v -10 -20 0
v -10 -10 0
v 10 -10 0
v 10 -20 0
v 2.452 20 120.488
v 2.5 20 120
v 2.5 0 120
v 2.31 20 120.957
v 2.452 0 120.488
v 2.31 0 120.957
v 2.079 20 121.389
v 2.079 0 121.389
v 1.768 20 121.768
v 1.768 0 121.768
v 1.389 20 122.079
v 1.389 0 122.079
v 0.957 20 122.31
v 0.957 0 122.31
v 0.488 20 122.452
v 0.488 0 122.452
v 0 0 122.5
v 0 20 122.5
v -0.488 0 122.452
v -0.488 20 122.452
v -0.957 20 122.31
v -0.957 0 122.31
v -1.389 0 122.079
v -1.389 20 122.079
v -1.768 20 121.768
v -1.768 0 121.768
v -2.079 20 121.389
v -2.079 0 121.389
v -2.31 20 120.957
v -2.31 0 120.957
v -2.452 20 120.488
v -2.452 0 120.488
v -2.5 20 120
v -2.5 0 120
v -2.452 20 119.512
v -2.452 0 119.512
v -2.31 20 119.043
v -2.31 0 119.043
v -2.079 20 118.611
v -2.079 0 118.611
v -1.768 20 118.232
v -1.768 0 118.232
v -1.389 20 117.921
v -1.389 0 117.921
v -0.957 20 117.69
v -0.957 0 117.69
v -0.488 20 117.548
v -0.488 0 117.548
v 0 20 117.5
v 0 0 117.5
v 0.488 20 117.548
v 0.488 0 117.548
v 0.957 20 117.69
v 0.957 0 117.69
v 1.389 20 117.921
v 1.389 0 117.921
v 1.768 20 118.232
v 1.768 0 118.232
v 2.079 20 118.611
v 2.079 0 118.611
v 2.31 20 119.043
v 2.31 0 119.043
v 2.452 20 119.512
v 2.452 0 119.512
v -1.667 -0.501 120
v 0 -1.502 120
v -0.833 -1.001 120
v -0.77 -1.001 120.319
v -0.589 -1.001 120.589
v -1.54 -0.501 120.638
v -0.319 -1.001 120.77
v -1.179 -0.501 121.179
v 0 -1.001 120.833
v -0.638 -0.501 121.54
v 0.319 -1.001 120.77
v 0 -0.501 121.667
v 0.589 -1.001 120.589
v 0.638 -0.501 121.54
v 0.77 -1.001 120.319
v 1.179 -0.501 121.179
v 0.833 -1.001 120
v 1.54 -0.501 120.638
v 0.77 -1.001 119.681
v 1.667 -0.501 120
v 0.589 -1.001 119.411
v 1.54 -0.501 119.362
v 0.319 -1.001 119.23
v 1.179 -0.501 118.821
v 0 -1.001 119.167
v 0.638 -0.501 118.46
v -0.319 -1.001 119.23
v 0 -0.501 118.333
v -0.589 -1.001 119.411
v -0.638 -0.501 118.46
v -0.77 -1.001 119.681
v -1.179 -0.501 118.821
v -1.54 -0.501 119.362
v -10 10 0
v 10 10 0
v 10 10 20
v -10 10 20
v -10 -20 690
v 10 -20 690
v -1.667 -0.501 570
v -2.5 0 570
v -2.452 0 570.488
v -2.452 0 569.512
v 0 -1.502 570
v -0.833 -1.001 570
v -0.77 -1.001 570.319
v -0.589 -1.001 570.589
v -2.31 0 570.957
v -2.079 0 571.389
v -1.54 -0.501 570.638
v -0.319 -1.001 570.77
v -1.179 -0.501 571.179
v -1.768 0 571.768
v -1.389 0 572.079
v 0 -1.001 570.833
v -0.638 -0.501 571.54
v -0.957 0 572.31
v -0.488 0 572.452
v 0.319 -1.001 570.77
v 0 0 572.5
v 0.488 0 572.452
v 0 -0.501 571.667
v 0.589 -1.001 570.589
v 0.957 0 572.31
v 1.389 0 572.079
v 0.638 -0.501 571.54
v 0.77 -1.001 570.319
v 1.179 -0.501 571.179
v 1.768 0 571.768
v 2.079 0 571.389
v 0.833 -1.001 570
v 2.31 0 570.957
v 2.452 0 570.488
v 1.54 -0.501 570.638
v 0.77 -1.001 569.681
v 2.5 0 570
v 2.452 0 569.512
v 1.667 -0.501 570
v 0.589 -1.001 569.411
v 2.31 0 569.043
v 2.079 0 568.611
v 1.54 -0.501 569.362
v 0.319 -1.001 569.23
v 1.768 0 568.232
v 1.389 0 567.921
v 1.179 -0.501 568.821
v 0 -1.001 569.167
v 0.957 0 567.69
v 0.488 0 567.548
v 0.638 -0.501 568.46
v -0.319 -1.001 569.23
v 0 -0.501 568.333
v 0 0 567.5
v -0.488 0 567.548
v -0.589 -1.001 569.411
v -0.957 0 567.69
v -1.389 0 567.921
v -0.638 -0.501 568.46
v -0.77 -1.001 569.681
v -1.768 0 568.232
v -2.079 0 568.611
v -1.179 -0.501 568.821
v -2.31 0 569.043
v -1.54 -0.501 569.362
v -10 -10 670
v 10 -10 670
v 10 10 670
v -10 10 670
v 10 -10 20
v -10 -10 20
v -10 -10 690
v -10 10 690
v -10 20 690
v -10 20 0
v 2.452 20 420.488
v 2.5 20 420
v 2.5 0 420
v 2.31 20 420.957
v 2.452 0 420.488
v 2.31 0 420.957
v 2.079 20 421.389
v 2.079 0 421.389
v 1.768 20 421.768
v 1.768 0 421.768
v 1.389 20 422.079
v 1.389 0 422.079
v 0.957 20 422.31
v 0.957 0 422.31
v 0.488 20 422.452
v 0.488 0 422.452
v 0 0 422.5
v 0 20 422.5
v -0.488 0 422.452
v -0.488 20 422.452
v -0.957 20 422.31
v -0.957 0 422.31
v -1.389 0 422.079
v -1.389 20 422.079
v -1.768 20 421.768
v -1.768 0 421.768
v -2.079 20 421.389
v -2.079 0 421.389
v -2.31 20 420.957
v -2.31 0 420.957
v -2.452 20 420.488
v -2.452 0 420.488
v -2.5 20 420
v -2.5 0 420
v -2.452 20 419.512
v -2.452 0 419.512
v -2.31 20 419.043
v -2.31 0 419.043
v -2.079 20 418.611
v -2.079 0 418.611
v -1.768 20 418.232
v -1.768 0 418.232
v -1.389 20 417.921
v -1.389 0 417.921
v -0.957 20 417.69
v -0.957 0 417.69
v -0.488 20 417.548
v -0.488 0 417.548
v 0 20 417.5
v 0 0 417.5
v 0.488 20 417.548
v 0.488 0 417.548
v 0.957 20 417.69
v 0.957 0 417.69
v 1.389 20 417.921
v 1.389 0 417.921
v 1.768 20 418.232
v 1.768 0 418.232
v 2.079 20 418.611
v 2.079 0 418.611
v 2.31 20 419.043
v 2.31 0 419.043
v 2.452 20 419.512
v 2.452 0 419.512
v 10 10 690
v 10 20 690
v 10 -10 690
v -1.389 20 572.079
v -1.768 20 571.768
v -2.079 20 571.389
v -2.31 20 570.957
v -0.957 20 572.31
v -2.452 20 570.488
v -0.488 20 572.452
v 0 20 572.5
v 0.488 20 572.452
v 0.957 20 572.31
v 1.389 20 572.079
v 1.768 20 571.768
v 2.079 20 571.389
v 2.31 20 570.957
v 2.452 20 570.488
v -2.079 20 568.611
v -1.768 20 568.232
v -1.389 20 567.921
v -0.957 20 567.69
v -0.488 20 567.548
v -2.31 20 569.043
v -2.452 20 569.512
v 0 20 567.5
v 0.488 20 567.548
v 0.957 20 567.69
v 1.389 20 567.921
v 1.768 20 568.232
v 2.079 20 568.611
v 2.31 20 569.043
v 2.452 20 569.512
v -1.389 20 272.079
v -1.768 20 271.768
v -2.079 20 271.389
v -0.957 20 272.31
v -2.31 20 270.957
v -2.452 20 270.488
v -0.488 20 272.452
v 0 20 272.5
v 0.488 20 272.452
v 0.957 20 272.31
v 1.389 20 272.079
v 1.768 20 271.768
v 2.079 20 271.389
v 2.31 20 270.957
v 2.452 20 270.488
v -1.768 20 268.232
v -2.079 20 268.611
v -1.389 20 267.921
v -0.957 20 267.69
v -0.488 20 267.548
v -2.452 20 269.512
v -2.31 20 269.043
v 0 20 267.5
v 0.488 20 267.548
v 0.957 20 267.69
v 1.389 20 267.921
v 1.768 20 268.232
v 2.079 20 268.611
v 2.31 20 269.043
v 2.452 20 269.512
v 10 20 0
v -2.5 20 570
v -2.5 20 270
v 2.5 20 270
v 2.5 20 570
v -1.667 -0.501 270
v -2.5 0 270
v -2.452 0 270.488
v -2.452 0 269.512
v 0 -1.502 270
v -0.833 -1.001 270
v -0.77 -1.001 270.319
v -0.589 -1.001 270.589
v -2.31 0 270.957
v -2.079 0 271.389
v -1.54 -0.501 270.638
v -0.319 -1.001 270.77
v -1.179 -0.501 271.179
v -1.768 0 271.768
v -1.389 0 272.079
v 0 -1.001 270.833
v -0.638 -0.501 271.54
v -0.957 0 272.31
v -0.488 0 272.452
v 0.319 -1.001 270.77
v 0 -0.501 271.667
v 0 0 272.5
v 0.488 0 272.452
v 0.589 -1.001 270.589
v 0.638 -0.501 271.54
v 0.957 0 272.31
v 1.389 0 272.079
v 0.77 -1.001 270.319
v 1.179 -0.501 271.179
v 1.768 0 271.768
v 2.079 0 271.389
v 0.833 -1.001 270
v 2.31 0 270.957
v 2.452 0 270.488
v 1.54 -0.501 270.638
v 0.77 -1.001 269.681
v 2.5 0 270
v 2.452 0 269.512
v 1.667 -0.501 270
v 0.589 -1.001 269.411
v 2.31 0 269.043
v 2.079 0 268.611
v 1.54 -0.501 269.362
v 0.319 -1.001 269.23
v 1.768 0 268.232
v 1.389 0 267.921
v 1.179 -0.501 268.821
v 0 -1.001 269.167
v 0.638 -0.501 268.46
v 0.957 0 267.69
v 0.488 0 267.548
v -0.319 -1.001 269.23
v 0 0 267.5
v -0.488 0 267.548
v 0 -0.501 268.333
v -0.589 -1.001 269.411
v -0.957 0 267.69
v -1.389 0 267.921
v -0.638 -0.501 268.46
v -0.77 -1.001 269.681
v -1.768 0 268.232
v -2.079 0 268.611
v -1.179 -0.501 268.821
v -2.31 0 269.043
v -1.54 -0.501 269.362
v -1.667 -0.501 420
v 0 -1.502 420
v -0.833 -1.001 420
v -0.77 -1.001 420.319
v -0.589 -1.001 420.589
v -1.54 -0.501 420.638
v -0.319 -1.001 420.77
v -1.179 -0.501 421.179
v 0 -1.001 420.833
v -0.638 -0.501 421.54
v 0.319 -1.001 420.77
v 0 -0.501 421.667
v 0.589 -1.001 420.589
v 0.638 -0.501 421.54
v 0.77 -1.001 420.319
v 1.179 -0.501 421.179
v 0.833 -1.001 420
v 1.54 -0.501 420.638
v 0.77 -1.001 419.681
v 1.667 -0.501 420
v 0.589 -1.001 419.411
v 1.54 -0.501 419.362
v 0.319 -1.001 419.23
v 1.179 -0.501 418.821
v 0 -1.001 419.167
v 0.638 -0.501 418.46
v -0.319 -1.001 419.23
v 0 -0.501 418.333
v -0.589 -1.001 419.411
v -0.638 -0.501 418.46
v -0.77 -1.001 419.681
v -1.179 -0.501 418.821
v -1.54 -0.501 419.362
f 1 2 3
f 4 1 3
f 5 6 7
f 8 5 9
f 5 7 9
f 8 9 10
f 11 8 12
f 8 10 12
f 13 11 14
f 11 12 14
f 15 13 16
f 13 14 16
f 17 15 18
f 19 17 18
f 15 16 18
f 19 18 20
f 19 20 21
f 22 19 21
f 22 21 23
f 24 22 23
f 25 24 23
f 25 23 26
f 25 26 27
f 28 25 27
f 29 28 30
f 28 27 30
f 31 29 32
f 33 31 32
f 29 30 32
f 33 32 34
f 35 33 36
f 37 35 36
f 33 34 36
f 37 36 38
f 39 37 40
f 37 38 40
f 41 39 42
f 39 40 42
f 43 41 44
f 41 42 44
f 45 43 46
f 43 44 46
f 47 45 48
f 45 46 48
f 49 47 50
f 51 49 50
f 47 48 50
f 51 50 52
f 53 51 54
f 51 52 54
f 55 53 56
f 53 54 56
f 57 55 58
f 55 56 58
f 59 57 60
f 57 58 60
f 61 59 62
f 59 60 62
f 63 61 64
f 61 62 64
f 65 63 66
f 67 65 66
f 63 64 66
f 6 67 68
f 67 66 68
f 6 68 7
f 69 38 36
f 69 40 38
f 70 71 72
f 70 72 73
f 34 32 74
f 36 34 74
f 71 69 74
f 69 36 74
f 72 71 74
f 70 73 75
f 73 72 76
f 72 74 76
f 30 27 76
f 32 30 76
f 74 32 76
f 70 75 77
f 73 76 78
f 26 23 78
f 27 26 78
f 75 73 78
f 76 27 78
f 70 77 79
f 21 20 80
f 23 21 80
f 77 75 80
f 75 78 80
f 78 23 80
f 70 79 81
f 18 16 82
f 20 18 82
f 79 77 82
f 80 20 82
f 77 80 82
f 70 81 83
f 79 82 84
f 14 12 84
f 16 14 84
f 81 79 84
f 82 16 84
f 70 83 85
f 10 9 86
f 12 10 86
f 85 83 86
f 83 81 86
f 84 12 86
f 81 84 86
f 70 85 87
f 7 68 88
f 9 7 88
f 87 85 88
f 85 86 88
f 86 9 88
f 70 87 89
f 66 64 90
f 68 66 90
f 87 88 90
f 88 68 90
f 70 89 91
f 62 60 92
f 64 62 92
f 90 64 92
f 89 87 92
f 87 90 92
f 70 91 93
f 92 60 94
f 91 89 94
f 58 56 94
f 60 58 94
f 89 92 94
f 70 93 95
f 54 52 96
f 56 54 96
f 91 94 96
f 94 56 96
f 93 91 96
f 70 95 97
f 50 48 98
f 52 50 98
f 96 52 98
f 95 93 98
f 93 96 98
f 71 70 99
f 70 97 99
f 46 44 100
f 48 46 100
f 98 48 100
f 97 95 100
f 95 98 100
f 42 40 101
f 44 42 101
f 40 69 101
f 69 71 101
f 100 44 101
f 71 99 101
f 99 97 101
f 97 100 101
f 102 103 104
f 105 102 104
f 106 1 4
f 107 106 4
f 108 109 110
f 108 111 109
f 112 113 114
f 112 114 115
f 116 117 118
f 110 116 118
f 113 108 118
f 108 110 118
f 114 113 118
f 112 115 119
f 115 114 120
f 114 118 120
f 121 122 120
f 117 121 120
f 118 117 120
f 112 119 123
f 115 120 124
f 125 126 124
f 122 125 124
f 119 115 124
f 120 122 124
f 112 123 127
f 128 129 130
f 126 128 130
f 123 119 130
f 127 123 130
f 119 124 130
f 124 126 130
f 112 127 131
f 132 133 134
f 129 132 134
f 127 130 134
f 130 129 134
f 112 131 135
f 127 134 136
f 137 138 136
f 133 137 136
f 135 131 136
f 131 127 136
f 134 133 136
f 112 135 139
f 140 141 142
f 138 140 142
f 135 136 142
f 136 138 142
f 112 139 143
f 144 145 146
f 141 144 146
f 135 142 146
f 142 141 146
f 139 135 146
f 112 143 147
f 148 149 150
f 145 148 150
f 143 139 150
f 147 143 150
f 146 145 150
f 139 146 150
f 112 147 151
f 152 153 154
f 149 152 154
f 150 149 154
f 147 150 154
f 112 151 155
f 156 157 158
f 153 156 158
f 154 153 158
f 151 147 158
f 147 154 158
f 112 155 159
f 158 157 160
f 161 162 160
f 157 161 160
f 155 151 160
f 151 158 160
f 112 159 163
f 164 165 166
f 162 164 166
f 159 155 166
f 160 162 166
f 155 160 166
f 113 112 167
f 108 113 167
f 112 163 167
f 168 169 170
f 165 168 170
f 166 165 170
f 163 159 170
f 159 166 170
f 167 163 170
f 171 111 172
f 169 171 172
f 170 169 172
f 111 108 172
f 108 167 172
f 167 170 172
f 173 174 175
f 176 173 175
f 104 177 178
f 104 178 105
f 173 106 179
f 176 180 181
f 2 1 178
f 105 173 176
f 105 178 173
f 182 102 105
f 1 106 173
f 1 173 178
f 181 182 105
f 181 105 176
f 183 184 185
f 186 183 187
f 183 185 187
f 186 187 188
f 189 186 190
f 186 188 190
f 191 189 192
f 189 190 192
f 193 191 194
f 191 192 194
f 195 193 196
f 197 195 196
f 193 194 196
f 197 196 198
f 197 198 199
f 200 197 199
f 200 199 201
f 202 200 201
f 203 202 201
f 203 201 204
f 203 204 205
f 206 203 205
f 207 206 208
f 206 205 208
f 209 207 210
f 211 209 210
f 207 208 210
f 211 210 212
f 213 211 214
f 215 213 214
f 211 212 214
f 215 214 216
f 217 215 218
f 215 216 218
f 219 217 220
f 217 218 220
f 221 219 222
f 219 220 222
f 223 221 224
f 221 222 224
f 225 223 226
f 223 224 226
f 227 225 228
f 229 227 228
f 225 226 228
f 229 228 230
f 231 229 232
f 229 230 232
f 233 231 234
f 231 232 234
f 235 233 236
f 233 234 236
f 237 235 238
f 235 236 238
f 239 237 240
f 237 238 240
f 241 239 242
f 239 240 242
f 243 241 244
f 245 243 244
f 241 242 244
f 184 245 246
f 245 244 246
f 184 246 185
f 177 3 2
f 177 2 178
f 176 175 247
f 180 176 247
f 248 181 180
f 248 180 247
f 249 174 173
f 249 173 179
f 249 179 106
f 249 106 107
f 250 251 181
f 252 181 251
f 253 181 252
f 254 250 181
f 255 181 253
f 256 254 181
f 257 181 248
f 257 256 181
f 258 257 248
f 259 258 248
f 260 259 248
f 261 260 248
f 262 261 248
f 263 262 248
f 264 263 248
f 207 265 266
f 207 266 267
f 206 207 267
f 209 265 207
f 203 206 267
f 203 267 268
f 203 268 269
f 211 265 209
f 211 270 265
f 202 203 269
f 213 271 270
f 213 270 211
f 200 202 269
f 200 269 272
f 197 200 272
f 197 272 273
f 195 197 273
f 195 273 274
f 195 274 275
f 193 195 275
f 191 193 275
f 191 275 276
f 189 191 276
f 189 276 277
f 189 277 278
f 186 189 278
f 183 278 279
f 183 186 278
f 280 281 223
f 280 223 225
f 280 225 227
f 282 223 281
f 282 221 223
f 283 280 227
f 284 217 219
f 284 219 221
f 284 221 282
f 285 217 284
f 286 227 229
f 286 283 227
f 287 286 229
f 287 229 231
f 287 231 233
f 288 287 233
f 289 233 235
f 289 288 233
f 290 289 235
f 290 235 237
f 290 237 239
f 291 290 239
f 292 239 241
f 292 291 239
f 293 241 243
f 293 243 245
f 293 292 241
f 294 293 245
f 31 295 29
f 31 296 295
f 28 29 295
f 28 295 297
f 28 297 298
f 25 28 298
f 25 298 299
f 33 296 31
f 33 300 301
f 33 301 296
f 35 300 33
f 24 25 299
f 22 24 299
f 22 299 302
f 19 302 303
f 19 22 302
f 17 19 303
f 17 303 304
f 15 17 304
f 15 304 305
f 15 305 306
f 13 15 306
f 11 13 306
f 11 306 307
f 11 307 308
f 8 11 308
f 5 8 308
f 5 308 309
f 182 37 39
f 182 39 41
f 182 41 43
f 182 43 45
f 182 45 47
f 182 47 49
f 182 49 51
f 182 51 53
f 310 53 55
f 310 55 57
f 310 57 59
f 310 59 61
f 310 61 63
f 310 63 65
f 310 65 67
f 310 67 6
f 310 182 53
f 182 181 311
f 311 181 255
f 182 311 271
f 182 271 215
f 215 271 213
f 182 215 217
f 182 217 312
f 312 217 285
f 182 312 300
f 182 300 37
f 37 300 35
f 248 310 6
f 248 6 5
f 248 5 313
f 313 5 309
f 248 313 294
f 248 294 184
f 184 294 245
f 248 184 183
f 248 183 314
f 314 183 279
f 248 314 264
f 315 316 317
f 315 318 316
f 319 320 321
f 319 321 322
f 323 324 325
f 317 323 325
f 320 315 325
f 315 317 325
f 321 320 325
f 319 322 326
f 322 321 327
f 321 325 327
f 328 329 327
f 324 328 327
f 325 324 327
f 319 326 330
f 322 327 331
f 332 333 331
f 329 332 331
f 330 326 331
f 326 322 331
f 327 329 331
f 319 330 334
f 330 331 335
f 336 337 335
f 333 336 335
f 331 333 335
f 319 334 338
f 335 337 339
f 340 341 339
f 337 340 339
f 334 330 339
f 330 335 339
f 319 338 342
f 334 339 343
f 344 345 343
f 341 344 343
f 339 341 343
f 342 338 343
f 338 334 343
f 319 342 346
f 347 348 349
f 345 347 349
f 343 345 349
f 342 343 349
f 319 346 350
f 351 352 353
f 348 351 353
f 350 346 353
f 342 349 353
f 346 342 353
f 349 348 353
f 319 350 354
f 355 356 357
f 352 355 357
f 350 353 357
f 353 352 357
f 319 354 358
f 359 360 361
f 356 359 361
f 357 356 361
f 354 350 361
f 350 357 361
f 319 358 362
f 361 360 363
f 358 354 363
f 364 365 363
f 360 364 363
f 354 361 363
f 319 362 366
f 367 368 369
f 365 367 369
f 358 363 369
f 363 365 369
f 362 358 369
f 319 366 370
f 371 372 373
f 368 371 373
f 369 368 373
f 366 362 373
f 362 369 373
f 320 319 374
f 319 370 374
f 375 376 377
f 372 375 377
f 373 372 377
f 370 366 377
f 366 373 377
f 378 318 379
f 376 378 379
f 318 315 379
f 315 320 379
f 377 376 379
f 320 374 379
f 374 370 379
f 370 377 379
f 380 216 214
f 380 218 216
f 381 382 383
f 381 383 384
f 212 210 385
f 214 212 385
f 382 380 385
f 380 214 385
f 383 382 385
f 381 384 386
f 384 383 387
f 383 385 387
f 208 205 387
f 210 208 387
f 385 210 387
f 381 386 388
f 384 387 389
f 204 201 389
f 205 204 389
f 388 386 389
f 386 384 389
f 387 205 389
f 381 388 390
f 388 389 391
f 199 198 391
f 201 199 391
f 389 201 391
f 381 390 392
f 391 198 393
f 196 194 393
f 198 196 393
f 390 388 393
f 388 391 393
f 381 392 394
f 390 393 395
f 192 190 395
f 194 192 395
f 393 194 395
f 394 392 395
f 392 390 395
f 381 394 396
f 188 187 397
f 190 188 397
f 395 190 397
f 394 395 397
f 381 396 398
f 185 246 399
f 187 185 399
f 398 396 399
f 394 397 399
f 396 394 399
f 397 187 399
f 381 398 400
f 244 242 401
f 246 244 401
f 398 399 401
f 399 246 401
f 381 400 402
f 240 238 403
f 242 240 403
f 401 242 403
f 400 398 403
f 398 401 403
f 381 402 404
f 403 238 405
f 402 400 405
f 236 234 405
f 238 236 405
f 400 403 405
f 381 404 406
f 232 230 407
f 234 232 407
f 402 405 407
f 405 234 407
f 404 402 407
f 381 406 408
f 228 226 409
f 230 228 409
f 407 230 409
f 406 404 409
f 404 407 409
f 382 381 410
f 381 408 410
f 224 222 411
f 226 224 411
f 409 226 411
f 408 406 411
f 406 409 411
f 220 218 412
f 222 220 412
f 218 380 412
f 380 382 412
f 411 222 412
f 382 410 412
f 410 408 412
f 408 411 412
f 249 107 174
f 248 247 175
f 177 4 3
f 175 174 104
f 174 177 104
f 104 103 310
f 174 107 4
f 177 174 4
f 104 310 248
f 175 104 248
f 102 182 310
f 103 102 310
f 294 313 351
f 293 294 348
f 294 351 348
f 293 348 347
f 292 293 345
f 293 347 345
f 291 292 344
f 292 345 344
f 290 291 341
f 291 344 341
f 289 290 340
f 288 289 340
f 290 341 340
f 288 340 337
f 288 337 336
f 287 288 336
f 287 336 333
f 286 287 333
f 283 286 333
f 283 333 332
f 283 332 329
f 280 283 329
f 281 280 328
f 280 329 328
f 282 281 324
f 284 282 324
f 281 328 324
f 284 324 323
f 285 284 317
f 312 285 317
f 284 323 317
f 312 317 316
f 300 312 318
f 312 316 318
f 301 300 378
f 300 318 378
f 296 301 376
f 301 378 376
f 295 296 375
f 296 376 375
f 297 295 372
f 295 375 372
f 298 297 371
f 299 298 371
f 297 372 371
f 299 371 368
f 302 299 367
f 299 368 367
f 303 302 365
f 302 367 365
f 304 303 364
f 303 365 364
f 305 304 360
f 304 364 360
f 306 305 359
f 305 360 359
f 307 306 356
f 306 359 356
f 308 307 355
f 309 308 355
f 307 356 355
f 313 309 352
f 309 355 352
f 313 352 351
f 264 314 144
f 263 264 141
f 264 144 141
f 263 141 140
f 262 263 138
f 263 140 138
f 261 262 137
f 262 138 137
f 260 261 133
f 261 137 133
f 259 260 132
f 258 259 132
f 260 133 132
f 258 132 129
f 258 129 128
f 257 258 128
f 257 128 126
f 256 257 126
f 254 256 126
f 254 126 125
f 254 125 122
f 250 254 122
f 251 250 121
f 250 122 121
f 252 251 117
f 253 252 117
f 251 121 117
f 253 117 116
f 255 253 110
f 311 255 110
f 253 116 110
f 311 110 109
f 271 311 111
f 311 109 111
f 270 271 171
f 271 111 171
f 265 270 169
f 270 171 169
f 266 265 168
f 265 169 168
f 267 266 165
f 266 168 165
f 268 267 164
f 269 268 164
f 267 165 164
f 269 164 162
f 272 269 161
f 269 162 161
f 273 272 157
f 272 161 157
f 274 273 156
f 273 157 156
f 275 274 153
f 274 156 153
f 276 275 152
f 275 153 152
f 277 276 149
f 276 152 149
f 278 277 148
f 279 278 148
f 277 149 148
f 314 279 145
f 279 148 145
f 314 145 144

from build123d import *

# Parameters (mm, degrees)
F0_W     = 20
F0_H     = 40
F1_DEPTH = 690
F3_D     = 5
F3_DEPTH = 20
F3_TIP   = 1.5021515476
F4_W     = 20
F4_H     = 20
F5_DEPTH = 66.8
F6_W     = 20
F6_H     = 20
F7_DEPTH = 25


with BuildPart() as f1:
    # F0 (on Top) → F1 (new body)
    with BuildSketch(Plane.XY):
        Rectangle(F0_W, F0_H)
    extrude(amount=F1_DEPTH)

    # F3
    with Locations(Plane(origin=(0, 20, 0), x_dir=(-1, 0, 0), z_dir=(0, 1, 0))):
        with Locations((0, 570), (0, 420), (0, 270), (0, 120)):
            Hole(F3_D / 2, depth=F3_DEPTH)
            with Locations((0, 0, -(F3_DEPTH + F3_TIP / 2))):  # 118° drill point
                Cone(0, F3_D / 2, F3_TIP, mode=Mode.SUBTRACT)

    # F4 (on face) → F5 (cut)
    with BuildSketch(Plane.YZ.offset(10)):
        with Locations((0, 680)):
            Rectangle(F4_W, F4_H)
    extrude(amount=-F5_DEPTH, mode=Mode.SUBTRACT)

    # F6 (on face) → F7 (cut)
    with BuildSketch(Plane.YZ.offset(10)):
        with Locations((0, 10)):
            Rectangle(F6_W, F6_H)
    extrude(amount=-F7_DEPTH, mode=Mode.SUBTRACT)


with BuildPart() as f8_1:
    # F8: copy of F1
    add(f1.part)


solid = f1.part
